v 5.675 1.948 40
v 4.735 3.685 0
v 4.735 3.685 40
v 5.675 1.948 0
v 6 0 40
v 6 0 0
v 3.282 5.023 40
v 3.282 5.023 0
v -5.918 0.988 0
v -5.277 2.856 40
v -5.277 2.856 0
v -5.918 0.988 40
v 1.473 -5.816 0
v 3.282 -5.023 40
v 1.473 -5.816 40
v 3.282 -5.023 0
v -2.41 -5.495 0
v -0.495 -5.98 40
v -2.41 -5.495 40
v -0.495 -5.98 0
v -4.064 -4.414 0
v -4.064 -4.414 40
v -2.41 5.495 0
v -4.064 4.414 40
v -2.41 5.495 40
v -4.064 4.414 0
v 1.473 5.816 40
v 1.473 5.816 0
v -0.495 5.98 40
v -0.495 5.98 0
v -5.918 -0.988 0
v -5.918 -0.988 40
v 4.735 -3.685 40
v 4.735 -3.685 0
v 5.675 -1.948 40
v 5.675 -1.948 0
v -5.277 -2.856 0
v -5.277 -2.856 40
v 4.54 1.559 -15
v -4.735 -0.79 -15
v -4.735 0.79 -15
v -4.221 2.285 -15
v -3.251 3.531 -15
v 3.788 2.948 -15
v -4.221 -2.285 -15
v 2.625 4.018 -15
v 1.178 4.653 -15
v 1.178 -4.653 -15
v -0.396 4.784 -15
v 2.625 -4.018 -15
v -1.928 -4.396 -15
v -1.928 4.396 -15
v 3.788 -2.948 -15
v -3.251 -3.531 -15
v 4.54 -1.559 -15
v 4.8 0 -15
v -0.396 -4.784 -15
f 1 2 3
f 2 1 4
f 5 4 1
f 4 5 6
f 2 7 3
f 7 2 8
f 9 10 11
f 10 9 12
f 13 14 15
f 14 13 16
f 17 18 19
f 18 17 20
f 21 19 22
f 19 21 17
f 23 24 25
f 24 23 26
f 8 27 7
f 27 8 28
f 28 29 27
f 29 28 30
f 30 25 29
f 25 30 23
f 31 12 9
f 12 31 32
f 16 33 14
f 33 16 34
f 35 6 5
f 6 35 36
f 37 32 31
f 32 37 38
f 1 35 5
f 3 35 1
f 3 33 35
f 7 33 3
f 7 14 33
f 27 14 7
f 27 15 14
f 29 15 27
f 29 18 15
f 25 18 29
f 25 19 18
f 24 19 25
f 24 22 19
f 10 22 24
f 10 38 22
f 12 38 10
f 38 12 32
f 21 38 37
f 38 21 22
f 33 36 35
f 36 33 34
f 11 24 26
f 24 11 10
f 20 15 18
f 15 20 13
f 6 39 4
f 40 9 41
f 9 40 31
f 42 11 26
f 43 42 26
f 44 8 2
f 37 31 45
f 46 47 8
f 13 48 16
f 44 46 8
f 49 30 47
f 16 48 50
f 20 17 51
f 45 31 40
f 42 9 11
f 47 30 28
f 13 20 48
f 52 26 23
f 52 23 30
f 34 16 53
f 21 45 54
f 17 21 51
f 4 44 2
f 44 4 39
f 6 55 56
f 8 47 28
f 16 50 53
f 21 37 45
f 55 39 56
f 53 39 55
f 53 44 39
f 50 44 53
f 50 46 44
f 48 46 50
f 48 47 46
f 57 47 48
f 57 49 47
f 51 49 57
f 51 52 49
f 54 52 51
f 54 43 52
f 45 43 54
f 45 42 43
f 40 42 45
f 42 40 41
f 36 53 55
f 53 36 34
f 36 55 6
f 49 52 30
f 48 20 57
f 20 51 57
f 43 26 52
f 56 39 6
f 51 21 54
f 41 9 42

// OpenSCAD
cylinder(h=40,d=12);
translate([0, 0, -15]);
mirror([0, 0, 1])
linear_extrude(height=15, scale=.8) circle(d=12);
